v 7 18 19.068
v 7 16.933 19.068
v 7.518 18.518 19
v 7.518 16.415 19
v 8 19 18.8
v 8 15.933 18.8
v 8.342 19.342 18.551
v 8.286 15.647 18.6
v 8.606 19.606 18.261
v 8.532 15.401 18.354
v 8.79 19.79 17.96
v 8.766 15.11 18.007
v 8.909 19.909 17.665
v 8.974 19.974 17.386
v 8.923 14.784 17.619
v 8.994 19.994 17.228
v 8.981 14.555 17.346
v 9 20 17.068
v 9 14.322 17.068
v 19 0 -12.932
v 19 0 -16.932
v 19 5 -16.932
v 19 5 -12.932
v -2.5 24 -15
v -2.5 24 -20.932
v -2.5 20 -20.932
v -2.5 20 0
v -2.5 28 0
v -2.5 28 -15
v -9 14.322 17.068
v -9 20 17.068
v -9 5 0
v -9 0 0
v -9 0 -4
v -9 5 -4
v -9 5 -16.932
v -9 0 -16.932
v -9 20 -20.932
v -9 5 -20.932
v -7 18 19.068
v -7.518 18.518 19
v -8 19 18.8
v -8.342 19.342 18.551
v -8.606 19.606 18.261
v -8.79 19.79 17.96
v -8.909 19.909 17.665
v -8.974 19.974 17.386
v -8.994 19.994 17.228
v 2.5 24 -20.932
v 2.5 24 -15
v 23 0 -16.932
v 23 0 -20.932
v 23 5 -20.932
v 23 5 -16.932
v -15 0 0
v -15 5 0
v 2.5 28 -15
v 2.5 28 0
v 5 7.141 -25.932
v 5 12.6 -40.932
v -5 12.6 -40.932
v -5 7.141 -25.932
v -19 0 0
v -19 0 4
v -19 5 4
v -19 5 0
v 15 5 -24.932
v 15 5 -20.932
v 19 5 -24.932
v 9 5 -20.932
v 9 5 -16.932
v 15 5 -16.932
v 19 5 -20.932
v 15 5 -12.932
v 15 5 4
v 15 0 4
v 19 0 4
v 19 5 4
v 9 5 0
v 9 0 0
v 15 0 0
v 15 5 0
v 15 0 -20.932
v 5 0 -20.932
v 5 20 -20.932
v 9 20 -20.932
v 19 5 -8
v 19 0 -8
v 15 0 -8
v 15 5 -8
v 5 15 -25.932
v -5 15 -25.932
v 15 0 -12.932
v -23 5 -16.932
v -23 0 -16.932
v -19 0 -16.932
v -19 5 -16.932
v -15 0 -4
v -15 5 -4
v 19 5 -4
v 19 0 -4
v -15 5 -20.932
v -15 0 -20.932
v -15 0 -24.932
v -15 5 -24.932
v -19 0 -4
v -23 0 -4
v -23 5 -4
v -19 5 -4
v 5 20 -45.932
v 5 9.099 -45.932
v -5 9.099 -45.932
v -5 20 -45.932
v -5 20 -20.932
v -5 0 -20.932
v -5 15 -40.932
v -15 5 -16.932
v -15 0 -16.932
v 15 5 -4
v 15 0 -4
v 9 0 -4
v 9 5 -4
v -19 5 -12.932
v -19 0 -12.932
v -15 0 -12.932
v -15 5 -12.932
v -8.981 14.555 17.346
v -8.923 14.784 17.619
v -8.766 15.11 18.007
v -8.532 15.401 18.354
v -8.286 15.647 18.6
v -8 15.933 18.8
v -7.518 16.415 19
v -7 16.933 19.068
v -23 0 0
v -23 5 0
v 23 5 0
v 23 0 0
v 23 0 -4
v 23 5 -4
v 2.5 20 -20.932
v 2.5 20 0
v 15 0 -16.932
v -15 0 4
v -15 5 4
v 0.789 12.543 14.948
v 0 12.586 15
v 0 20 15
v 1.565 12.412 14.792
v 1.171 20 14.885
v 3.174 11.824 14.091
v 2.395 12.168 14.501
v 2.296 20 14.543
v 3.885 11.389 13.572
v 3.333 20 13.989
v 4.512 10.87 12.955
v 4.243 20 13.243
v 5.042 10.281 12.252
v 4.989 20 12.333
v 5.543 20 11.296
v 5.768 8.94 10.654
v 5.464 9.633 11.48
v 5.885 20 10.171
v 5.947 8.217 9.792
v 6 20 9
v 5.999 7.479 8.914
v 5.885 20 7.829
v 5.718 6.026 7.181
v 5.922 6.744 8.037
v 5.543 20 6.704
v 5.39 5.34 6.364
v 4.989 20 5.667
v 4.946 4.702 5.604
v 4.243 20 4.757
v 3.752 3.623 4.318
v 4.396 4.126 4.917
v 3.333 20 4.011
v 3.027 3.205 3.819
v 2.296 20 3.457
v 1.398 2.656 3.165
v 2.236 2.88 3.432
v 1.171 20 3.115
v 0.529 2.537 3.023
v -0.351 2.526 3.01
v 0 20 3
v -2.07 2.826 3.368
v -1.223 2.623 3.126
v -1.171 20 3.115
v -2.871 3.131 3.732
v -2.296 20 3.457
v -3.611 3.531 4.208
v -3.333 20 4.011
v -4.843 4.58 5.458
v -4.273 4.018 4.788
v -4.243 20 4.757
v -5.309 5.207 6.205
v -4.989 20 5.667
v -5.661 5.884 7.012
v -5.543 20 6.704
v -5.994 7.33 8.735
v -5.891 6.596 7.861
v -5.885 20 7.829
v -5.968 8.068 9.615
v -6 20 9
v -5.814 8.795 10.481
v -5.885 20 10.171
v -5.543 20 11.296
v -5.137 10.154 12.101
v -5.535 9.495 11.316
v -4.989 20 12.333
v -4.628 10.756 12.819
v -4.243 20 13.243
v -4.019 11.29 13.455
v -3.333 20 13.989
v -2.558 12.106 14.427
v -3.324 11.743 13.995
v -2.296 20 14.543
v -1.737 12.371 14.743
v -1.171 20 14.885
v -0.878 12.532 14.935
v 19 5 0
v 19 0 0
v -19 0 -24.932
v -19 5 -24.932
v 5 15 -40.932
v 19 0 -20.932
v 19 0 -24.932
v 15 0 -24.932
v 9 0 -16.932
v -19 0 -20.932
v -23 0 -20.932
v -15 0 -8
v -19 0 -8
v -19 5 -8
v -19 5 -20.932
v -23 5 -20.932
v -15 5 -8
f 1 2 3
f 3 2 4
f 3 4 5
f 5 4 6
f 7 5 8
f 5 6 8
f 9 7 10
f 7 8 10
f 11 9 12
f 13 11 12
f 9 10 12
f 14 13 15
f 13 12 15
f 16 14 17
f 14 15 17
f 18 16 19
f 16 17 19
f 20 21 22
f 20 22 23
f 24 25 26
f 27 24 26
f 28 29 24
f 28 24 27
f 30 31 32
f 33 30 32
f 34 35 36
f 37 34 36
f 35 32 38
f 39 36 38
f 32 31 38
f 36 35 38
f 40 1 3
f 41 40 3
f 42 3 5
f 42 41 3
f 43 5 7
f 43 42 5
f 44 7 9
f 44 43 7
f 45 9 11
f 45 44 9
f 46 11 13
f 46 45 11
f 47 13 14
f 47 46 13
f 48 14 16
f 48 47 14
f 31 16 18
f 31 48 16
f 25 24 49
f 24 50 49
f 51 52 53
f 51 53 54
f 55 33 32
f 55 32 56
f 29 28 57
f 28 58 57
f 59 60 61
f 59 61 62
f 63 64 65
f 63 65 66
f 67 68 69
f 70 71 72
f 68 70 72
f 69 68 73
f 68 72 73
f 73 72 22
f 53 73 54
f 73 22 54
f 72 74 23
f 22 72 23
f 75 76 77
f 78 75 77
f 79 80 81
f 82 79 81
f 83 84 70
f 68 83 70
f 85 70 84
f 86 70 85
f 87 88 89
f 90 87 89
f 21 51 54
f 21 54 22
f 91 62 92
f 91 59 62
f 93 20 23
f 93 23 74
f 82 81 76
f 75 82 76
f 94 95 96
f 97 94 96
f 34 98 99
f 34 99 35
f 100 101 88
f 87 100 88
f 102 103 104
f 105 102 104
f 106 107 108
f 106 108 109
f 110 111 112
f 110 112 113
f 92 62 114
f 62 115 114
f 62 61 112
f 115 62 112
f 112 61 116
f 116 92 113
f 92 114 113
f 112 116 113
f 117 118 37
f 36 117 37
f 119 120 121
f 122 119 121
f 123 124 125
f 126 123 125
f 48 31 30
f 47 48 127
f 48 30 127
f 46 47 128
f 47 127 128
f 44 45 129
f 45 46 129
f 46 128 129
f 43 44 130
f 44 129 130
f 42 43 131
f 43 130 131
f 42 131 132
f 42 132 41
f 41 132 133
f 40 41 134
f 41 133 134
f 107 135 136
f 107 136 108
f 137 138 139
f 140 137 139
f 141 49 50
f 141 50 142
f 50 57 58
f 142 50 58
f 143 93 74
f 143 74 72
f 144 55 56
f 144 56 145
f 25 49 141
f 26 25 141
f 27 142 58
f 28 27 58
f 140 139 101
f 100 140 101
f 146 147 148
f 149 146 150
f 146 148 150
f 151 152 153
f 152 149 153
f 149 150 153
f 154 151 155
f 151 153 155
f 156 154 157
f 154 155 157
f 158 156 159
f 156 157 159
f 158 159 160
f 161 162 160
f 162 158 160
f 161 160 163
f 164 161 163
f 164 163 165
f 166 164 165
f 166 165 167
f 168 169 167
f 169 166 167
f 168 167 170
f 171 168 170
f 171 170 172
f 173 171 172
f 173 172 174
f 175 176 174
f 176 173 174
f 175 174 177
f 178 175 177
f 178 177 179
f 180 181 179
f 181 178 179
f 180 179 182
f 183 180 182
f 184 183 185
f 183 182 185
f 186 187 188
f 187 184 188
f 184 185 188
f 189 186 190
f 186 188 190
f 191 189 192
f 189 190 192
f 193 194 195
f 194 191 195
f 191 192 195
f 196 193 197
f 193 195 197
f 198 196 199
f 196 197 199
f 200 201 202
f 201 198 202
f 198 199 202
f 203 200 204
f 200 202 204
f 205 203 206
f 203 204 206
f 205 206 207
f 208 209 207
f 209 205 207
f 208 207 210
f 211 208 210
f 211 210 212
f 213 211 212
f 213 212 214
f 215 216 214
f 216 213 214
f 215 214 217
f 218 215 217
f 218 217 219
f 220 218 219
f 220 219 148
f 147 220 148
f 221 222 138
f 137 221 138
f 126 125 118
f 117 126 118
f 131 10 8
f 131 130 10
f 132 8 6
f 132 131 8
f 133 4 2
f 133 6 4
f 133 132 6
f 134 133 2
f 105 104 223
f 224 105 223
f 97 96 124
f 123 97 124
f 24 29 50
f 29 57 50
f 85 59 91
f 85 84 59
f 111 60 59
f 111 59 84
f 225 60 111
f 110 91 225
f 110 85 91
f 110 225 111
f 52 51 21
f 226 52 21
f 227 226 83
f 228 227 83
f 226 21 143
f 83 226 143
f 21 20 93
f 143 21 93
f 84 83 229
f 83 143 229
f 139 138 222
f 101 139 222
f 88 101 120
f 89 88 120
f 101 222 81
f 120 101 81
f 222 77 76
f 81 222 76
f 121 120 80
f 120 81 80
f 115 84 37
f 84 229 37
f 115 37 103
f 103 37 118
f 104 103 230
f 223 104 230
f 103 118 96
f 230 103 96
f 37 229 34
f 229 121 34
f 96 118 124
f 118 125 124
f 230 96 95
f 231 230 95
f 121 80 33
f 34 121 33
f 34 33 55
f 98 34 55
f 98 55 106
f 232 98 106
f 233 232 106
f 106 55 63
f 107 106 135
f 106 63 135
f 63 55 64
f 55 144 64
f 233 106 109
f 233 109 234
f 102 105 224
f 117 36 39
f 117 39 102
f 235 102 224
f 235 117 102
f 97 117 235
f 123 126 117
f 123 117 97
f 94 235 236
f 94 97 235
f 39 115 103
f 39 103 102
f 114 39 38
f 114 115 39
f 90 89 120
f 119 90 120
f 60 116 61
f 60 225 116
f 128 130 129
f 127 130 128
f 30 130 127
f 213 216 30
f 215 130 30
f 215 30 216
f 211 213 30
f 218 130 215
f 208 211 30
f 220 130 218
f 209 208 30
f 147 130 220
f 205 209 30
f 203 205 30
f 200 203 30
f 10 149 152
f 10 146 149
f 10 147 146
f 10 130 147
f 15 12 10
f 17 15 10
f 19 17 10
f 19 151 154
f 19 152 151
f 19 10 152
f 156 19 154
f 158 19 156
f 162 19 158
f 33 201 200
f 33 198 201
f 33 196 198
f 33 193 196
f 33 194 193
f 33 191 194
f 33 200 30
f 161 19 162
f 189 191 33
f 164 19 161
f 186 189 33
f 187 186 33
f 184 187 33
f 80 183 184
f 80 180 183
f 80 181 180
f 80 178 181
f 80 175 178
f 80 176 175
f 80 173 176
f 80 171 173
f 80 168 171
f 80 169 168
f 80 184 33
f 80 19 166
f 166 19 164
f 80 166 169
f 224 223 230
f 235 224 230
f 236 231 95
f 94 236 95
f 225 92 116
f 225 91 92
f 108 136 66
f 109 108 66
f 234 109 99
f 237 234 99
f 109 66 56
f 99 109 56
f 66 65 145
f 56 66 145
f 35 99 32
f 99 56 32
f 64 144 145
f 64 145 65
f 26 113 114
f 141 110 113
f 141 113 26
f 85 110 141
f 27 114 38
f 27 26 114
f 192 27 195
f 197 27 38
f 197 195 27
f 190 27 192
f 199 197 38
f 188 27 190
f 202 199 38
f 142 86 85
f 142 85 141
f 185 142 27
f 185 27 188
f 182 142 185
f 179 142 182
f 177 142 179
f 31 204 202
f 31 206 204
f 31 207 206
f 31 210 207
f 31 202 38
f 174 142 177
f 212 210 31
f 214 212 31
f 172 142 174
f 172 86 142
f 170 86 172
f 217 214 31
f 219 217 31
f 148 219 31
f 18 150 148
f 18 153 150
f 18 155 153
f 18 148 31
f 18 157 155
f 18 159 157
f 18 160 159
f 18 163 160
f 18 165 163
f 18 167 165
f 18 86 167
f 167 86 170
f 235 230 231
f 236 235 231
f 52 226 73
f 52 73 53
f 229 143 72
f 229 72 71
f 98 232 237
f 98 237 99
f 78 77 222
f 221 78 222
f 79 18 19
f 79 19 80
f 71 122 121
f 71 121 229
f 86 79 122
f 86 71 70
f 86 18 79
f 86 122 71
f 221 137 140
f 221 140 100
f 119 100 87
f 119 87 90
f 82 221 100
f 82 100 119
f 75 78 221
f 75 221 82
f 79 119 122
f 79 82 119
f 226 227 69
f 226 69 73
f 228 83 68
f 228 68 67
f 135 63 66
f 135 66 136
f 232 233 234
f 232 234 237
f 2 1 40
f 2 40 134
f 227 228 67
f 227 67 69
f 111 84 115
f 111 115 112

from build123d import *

# Parameters (mm, degrees)
EXTRUDE_1_DEPTH     = 9
EXTRUDE_2_DEPTH     = 5
SKETCH_3_R          = 6
CUT_EXTRUDE_1_DEPTH = 30
FILLET_1_R          = 2
EXTRUDE_3_DEPTH     = 5
EXTRUDE_5_DEPTH     = 2.5


with BuildPart() as part:
    # Эскиз1 → Бобышка-Вытянуть1 (new, symmetric)
    with BuildSketch(Plane(origin=(0, 0, 0), x_dir=(0, 0, -1), z_dir=(1, 0, 0))):
        Polygon((-19.068057482, 16), (0, 0), (8.082464074, 0), (20.931942518, 0), (20.931942518, 20), (8.082464074, 20), (-19.068057482, 20), align=None)
    extrude(amount=EXTRUDE_1_DEPTH, both=True)

    # Эскиз1<3> → Бобышка-Вытянуть2 (add, symmetric)
    with BuildSketch(Plane(origin=(0, 0, 0), x_dir=(0, 0, -1), z_dir=(1, 0, 0))):
        Polygon((20.931942518, 20), (20.931942518, 0), (45.931942518, 9.099255857), (45.931942518, 20), (30, 20), align=None)
        Polygon((40.931942518, 12.600293548), (25.931942518, 7.140740034), (25.931942518, 15), (40.931942518, 15), align=None, mode=Mode.SUBTRACT)
    extrude(amount=EXTRUDE_2_DEPTH, both=True)

    # Эскиз3 → Вырез-Вытянуть1 (cut)
    with BuildSketch(Plane(origin=(0, 20, 0), x_dir=(1, 0, 0), z_dir=(0, 1, 0))):
        with Locations((0, -9)):
            Circle(SKETCH_3_R)
    extrude(amount=-CUT_EXTRUDE_1_DEPTH, mode=Mode.SUBTRACT)

    # Скругление1
    fillet_1_edges = [part.edges().sort_by_distance(p)[0] for p in [
        (0, 20, 19.068057482),
        (9, 18, 19.068057482),
        (0, 16, 19.068057482),
        (-9, 18, 19.068057482),
    ]]
    fillet(fillet_1_edges, radius=FILLET_1_R)

    # Эскиз4 → Бобышка-Вытянуть3 (add)
    with BuildSketch(Plane.XZ):
        Polygon((9, 0), (15, 0), (15, 4), (19, 4), (19, 0), (23, 0), (23, -4), (19, -4), (19, -8), (15, -8), (15, -4), (9, -4), align=None)
        Polygon((-23, 0), (-23, -4), (-19, -4), (-19, -8), (-15, -8), (-15, -4), (-9, -4), (-9, 0), (-15, 0), (-15, 4), (-19, 4), (-19, 0), align=None)
        Polygon((15, -16.931942518), (9, -16.931942518), (9, -20.931942518), (15, -20.931942518), (15, -24.931942518), (19, -24.931942518), (19, -20.931942518), (23, -20.931942518), (23, -16.931942518), (19, -16.931942518), (19, -12.931942518), (15, -12.931942518), align=None)
        Polygon((-19, -20.931942518), (-23, -20.931942518), (-23, -16.931942518), (-19, -16.931942518), (-19, -12.931942518), (-15, -12.931942518), (-15, -16.931942518), (-9, -16.931942518), (-9, -20.931942518), (-15, -20.931942518), (-15, -24.931942518), (-19, -24.931942518), align=None)
    extrude(amount=-EXTRUDE_3_DEPTH)

    # Эскиз5 → Бобышка-Вытянуть5 (add, symmetric)
    with BuildSketch(Plane(origin=(0, 0, 0), x_dir=(0, 0, -1), z_dir=(1, 0, 0))):
        Polygon((0, 20), (0, 28), (15, 28), (15, 24), (20.931942518, 24), (20.931942518, 20), align=None)
    extrude(amount=EXTRUDE_5_DEPTH, both=True)


solid = part.part
